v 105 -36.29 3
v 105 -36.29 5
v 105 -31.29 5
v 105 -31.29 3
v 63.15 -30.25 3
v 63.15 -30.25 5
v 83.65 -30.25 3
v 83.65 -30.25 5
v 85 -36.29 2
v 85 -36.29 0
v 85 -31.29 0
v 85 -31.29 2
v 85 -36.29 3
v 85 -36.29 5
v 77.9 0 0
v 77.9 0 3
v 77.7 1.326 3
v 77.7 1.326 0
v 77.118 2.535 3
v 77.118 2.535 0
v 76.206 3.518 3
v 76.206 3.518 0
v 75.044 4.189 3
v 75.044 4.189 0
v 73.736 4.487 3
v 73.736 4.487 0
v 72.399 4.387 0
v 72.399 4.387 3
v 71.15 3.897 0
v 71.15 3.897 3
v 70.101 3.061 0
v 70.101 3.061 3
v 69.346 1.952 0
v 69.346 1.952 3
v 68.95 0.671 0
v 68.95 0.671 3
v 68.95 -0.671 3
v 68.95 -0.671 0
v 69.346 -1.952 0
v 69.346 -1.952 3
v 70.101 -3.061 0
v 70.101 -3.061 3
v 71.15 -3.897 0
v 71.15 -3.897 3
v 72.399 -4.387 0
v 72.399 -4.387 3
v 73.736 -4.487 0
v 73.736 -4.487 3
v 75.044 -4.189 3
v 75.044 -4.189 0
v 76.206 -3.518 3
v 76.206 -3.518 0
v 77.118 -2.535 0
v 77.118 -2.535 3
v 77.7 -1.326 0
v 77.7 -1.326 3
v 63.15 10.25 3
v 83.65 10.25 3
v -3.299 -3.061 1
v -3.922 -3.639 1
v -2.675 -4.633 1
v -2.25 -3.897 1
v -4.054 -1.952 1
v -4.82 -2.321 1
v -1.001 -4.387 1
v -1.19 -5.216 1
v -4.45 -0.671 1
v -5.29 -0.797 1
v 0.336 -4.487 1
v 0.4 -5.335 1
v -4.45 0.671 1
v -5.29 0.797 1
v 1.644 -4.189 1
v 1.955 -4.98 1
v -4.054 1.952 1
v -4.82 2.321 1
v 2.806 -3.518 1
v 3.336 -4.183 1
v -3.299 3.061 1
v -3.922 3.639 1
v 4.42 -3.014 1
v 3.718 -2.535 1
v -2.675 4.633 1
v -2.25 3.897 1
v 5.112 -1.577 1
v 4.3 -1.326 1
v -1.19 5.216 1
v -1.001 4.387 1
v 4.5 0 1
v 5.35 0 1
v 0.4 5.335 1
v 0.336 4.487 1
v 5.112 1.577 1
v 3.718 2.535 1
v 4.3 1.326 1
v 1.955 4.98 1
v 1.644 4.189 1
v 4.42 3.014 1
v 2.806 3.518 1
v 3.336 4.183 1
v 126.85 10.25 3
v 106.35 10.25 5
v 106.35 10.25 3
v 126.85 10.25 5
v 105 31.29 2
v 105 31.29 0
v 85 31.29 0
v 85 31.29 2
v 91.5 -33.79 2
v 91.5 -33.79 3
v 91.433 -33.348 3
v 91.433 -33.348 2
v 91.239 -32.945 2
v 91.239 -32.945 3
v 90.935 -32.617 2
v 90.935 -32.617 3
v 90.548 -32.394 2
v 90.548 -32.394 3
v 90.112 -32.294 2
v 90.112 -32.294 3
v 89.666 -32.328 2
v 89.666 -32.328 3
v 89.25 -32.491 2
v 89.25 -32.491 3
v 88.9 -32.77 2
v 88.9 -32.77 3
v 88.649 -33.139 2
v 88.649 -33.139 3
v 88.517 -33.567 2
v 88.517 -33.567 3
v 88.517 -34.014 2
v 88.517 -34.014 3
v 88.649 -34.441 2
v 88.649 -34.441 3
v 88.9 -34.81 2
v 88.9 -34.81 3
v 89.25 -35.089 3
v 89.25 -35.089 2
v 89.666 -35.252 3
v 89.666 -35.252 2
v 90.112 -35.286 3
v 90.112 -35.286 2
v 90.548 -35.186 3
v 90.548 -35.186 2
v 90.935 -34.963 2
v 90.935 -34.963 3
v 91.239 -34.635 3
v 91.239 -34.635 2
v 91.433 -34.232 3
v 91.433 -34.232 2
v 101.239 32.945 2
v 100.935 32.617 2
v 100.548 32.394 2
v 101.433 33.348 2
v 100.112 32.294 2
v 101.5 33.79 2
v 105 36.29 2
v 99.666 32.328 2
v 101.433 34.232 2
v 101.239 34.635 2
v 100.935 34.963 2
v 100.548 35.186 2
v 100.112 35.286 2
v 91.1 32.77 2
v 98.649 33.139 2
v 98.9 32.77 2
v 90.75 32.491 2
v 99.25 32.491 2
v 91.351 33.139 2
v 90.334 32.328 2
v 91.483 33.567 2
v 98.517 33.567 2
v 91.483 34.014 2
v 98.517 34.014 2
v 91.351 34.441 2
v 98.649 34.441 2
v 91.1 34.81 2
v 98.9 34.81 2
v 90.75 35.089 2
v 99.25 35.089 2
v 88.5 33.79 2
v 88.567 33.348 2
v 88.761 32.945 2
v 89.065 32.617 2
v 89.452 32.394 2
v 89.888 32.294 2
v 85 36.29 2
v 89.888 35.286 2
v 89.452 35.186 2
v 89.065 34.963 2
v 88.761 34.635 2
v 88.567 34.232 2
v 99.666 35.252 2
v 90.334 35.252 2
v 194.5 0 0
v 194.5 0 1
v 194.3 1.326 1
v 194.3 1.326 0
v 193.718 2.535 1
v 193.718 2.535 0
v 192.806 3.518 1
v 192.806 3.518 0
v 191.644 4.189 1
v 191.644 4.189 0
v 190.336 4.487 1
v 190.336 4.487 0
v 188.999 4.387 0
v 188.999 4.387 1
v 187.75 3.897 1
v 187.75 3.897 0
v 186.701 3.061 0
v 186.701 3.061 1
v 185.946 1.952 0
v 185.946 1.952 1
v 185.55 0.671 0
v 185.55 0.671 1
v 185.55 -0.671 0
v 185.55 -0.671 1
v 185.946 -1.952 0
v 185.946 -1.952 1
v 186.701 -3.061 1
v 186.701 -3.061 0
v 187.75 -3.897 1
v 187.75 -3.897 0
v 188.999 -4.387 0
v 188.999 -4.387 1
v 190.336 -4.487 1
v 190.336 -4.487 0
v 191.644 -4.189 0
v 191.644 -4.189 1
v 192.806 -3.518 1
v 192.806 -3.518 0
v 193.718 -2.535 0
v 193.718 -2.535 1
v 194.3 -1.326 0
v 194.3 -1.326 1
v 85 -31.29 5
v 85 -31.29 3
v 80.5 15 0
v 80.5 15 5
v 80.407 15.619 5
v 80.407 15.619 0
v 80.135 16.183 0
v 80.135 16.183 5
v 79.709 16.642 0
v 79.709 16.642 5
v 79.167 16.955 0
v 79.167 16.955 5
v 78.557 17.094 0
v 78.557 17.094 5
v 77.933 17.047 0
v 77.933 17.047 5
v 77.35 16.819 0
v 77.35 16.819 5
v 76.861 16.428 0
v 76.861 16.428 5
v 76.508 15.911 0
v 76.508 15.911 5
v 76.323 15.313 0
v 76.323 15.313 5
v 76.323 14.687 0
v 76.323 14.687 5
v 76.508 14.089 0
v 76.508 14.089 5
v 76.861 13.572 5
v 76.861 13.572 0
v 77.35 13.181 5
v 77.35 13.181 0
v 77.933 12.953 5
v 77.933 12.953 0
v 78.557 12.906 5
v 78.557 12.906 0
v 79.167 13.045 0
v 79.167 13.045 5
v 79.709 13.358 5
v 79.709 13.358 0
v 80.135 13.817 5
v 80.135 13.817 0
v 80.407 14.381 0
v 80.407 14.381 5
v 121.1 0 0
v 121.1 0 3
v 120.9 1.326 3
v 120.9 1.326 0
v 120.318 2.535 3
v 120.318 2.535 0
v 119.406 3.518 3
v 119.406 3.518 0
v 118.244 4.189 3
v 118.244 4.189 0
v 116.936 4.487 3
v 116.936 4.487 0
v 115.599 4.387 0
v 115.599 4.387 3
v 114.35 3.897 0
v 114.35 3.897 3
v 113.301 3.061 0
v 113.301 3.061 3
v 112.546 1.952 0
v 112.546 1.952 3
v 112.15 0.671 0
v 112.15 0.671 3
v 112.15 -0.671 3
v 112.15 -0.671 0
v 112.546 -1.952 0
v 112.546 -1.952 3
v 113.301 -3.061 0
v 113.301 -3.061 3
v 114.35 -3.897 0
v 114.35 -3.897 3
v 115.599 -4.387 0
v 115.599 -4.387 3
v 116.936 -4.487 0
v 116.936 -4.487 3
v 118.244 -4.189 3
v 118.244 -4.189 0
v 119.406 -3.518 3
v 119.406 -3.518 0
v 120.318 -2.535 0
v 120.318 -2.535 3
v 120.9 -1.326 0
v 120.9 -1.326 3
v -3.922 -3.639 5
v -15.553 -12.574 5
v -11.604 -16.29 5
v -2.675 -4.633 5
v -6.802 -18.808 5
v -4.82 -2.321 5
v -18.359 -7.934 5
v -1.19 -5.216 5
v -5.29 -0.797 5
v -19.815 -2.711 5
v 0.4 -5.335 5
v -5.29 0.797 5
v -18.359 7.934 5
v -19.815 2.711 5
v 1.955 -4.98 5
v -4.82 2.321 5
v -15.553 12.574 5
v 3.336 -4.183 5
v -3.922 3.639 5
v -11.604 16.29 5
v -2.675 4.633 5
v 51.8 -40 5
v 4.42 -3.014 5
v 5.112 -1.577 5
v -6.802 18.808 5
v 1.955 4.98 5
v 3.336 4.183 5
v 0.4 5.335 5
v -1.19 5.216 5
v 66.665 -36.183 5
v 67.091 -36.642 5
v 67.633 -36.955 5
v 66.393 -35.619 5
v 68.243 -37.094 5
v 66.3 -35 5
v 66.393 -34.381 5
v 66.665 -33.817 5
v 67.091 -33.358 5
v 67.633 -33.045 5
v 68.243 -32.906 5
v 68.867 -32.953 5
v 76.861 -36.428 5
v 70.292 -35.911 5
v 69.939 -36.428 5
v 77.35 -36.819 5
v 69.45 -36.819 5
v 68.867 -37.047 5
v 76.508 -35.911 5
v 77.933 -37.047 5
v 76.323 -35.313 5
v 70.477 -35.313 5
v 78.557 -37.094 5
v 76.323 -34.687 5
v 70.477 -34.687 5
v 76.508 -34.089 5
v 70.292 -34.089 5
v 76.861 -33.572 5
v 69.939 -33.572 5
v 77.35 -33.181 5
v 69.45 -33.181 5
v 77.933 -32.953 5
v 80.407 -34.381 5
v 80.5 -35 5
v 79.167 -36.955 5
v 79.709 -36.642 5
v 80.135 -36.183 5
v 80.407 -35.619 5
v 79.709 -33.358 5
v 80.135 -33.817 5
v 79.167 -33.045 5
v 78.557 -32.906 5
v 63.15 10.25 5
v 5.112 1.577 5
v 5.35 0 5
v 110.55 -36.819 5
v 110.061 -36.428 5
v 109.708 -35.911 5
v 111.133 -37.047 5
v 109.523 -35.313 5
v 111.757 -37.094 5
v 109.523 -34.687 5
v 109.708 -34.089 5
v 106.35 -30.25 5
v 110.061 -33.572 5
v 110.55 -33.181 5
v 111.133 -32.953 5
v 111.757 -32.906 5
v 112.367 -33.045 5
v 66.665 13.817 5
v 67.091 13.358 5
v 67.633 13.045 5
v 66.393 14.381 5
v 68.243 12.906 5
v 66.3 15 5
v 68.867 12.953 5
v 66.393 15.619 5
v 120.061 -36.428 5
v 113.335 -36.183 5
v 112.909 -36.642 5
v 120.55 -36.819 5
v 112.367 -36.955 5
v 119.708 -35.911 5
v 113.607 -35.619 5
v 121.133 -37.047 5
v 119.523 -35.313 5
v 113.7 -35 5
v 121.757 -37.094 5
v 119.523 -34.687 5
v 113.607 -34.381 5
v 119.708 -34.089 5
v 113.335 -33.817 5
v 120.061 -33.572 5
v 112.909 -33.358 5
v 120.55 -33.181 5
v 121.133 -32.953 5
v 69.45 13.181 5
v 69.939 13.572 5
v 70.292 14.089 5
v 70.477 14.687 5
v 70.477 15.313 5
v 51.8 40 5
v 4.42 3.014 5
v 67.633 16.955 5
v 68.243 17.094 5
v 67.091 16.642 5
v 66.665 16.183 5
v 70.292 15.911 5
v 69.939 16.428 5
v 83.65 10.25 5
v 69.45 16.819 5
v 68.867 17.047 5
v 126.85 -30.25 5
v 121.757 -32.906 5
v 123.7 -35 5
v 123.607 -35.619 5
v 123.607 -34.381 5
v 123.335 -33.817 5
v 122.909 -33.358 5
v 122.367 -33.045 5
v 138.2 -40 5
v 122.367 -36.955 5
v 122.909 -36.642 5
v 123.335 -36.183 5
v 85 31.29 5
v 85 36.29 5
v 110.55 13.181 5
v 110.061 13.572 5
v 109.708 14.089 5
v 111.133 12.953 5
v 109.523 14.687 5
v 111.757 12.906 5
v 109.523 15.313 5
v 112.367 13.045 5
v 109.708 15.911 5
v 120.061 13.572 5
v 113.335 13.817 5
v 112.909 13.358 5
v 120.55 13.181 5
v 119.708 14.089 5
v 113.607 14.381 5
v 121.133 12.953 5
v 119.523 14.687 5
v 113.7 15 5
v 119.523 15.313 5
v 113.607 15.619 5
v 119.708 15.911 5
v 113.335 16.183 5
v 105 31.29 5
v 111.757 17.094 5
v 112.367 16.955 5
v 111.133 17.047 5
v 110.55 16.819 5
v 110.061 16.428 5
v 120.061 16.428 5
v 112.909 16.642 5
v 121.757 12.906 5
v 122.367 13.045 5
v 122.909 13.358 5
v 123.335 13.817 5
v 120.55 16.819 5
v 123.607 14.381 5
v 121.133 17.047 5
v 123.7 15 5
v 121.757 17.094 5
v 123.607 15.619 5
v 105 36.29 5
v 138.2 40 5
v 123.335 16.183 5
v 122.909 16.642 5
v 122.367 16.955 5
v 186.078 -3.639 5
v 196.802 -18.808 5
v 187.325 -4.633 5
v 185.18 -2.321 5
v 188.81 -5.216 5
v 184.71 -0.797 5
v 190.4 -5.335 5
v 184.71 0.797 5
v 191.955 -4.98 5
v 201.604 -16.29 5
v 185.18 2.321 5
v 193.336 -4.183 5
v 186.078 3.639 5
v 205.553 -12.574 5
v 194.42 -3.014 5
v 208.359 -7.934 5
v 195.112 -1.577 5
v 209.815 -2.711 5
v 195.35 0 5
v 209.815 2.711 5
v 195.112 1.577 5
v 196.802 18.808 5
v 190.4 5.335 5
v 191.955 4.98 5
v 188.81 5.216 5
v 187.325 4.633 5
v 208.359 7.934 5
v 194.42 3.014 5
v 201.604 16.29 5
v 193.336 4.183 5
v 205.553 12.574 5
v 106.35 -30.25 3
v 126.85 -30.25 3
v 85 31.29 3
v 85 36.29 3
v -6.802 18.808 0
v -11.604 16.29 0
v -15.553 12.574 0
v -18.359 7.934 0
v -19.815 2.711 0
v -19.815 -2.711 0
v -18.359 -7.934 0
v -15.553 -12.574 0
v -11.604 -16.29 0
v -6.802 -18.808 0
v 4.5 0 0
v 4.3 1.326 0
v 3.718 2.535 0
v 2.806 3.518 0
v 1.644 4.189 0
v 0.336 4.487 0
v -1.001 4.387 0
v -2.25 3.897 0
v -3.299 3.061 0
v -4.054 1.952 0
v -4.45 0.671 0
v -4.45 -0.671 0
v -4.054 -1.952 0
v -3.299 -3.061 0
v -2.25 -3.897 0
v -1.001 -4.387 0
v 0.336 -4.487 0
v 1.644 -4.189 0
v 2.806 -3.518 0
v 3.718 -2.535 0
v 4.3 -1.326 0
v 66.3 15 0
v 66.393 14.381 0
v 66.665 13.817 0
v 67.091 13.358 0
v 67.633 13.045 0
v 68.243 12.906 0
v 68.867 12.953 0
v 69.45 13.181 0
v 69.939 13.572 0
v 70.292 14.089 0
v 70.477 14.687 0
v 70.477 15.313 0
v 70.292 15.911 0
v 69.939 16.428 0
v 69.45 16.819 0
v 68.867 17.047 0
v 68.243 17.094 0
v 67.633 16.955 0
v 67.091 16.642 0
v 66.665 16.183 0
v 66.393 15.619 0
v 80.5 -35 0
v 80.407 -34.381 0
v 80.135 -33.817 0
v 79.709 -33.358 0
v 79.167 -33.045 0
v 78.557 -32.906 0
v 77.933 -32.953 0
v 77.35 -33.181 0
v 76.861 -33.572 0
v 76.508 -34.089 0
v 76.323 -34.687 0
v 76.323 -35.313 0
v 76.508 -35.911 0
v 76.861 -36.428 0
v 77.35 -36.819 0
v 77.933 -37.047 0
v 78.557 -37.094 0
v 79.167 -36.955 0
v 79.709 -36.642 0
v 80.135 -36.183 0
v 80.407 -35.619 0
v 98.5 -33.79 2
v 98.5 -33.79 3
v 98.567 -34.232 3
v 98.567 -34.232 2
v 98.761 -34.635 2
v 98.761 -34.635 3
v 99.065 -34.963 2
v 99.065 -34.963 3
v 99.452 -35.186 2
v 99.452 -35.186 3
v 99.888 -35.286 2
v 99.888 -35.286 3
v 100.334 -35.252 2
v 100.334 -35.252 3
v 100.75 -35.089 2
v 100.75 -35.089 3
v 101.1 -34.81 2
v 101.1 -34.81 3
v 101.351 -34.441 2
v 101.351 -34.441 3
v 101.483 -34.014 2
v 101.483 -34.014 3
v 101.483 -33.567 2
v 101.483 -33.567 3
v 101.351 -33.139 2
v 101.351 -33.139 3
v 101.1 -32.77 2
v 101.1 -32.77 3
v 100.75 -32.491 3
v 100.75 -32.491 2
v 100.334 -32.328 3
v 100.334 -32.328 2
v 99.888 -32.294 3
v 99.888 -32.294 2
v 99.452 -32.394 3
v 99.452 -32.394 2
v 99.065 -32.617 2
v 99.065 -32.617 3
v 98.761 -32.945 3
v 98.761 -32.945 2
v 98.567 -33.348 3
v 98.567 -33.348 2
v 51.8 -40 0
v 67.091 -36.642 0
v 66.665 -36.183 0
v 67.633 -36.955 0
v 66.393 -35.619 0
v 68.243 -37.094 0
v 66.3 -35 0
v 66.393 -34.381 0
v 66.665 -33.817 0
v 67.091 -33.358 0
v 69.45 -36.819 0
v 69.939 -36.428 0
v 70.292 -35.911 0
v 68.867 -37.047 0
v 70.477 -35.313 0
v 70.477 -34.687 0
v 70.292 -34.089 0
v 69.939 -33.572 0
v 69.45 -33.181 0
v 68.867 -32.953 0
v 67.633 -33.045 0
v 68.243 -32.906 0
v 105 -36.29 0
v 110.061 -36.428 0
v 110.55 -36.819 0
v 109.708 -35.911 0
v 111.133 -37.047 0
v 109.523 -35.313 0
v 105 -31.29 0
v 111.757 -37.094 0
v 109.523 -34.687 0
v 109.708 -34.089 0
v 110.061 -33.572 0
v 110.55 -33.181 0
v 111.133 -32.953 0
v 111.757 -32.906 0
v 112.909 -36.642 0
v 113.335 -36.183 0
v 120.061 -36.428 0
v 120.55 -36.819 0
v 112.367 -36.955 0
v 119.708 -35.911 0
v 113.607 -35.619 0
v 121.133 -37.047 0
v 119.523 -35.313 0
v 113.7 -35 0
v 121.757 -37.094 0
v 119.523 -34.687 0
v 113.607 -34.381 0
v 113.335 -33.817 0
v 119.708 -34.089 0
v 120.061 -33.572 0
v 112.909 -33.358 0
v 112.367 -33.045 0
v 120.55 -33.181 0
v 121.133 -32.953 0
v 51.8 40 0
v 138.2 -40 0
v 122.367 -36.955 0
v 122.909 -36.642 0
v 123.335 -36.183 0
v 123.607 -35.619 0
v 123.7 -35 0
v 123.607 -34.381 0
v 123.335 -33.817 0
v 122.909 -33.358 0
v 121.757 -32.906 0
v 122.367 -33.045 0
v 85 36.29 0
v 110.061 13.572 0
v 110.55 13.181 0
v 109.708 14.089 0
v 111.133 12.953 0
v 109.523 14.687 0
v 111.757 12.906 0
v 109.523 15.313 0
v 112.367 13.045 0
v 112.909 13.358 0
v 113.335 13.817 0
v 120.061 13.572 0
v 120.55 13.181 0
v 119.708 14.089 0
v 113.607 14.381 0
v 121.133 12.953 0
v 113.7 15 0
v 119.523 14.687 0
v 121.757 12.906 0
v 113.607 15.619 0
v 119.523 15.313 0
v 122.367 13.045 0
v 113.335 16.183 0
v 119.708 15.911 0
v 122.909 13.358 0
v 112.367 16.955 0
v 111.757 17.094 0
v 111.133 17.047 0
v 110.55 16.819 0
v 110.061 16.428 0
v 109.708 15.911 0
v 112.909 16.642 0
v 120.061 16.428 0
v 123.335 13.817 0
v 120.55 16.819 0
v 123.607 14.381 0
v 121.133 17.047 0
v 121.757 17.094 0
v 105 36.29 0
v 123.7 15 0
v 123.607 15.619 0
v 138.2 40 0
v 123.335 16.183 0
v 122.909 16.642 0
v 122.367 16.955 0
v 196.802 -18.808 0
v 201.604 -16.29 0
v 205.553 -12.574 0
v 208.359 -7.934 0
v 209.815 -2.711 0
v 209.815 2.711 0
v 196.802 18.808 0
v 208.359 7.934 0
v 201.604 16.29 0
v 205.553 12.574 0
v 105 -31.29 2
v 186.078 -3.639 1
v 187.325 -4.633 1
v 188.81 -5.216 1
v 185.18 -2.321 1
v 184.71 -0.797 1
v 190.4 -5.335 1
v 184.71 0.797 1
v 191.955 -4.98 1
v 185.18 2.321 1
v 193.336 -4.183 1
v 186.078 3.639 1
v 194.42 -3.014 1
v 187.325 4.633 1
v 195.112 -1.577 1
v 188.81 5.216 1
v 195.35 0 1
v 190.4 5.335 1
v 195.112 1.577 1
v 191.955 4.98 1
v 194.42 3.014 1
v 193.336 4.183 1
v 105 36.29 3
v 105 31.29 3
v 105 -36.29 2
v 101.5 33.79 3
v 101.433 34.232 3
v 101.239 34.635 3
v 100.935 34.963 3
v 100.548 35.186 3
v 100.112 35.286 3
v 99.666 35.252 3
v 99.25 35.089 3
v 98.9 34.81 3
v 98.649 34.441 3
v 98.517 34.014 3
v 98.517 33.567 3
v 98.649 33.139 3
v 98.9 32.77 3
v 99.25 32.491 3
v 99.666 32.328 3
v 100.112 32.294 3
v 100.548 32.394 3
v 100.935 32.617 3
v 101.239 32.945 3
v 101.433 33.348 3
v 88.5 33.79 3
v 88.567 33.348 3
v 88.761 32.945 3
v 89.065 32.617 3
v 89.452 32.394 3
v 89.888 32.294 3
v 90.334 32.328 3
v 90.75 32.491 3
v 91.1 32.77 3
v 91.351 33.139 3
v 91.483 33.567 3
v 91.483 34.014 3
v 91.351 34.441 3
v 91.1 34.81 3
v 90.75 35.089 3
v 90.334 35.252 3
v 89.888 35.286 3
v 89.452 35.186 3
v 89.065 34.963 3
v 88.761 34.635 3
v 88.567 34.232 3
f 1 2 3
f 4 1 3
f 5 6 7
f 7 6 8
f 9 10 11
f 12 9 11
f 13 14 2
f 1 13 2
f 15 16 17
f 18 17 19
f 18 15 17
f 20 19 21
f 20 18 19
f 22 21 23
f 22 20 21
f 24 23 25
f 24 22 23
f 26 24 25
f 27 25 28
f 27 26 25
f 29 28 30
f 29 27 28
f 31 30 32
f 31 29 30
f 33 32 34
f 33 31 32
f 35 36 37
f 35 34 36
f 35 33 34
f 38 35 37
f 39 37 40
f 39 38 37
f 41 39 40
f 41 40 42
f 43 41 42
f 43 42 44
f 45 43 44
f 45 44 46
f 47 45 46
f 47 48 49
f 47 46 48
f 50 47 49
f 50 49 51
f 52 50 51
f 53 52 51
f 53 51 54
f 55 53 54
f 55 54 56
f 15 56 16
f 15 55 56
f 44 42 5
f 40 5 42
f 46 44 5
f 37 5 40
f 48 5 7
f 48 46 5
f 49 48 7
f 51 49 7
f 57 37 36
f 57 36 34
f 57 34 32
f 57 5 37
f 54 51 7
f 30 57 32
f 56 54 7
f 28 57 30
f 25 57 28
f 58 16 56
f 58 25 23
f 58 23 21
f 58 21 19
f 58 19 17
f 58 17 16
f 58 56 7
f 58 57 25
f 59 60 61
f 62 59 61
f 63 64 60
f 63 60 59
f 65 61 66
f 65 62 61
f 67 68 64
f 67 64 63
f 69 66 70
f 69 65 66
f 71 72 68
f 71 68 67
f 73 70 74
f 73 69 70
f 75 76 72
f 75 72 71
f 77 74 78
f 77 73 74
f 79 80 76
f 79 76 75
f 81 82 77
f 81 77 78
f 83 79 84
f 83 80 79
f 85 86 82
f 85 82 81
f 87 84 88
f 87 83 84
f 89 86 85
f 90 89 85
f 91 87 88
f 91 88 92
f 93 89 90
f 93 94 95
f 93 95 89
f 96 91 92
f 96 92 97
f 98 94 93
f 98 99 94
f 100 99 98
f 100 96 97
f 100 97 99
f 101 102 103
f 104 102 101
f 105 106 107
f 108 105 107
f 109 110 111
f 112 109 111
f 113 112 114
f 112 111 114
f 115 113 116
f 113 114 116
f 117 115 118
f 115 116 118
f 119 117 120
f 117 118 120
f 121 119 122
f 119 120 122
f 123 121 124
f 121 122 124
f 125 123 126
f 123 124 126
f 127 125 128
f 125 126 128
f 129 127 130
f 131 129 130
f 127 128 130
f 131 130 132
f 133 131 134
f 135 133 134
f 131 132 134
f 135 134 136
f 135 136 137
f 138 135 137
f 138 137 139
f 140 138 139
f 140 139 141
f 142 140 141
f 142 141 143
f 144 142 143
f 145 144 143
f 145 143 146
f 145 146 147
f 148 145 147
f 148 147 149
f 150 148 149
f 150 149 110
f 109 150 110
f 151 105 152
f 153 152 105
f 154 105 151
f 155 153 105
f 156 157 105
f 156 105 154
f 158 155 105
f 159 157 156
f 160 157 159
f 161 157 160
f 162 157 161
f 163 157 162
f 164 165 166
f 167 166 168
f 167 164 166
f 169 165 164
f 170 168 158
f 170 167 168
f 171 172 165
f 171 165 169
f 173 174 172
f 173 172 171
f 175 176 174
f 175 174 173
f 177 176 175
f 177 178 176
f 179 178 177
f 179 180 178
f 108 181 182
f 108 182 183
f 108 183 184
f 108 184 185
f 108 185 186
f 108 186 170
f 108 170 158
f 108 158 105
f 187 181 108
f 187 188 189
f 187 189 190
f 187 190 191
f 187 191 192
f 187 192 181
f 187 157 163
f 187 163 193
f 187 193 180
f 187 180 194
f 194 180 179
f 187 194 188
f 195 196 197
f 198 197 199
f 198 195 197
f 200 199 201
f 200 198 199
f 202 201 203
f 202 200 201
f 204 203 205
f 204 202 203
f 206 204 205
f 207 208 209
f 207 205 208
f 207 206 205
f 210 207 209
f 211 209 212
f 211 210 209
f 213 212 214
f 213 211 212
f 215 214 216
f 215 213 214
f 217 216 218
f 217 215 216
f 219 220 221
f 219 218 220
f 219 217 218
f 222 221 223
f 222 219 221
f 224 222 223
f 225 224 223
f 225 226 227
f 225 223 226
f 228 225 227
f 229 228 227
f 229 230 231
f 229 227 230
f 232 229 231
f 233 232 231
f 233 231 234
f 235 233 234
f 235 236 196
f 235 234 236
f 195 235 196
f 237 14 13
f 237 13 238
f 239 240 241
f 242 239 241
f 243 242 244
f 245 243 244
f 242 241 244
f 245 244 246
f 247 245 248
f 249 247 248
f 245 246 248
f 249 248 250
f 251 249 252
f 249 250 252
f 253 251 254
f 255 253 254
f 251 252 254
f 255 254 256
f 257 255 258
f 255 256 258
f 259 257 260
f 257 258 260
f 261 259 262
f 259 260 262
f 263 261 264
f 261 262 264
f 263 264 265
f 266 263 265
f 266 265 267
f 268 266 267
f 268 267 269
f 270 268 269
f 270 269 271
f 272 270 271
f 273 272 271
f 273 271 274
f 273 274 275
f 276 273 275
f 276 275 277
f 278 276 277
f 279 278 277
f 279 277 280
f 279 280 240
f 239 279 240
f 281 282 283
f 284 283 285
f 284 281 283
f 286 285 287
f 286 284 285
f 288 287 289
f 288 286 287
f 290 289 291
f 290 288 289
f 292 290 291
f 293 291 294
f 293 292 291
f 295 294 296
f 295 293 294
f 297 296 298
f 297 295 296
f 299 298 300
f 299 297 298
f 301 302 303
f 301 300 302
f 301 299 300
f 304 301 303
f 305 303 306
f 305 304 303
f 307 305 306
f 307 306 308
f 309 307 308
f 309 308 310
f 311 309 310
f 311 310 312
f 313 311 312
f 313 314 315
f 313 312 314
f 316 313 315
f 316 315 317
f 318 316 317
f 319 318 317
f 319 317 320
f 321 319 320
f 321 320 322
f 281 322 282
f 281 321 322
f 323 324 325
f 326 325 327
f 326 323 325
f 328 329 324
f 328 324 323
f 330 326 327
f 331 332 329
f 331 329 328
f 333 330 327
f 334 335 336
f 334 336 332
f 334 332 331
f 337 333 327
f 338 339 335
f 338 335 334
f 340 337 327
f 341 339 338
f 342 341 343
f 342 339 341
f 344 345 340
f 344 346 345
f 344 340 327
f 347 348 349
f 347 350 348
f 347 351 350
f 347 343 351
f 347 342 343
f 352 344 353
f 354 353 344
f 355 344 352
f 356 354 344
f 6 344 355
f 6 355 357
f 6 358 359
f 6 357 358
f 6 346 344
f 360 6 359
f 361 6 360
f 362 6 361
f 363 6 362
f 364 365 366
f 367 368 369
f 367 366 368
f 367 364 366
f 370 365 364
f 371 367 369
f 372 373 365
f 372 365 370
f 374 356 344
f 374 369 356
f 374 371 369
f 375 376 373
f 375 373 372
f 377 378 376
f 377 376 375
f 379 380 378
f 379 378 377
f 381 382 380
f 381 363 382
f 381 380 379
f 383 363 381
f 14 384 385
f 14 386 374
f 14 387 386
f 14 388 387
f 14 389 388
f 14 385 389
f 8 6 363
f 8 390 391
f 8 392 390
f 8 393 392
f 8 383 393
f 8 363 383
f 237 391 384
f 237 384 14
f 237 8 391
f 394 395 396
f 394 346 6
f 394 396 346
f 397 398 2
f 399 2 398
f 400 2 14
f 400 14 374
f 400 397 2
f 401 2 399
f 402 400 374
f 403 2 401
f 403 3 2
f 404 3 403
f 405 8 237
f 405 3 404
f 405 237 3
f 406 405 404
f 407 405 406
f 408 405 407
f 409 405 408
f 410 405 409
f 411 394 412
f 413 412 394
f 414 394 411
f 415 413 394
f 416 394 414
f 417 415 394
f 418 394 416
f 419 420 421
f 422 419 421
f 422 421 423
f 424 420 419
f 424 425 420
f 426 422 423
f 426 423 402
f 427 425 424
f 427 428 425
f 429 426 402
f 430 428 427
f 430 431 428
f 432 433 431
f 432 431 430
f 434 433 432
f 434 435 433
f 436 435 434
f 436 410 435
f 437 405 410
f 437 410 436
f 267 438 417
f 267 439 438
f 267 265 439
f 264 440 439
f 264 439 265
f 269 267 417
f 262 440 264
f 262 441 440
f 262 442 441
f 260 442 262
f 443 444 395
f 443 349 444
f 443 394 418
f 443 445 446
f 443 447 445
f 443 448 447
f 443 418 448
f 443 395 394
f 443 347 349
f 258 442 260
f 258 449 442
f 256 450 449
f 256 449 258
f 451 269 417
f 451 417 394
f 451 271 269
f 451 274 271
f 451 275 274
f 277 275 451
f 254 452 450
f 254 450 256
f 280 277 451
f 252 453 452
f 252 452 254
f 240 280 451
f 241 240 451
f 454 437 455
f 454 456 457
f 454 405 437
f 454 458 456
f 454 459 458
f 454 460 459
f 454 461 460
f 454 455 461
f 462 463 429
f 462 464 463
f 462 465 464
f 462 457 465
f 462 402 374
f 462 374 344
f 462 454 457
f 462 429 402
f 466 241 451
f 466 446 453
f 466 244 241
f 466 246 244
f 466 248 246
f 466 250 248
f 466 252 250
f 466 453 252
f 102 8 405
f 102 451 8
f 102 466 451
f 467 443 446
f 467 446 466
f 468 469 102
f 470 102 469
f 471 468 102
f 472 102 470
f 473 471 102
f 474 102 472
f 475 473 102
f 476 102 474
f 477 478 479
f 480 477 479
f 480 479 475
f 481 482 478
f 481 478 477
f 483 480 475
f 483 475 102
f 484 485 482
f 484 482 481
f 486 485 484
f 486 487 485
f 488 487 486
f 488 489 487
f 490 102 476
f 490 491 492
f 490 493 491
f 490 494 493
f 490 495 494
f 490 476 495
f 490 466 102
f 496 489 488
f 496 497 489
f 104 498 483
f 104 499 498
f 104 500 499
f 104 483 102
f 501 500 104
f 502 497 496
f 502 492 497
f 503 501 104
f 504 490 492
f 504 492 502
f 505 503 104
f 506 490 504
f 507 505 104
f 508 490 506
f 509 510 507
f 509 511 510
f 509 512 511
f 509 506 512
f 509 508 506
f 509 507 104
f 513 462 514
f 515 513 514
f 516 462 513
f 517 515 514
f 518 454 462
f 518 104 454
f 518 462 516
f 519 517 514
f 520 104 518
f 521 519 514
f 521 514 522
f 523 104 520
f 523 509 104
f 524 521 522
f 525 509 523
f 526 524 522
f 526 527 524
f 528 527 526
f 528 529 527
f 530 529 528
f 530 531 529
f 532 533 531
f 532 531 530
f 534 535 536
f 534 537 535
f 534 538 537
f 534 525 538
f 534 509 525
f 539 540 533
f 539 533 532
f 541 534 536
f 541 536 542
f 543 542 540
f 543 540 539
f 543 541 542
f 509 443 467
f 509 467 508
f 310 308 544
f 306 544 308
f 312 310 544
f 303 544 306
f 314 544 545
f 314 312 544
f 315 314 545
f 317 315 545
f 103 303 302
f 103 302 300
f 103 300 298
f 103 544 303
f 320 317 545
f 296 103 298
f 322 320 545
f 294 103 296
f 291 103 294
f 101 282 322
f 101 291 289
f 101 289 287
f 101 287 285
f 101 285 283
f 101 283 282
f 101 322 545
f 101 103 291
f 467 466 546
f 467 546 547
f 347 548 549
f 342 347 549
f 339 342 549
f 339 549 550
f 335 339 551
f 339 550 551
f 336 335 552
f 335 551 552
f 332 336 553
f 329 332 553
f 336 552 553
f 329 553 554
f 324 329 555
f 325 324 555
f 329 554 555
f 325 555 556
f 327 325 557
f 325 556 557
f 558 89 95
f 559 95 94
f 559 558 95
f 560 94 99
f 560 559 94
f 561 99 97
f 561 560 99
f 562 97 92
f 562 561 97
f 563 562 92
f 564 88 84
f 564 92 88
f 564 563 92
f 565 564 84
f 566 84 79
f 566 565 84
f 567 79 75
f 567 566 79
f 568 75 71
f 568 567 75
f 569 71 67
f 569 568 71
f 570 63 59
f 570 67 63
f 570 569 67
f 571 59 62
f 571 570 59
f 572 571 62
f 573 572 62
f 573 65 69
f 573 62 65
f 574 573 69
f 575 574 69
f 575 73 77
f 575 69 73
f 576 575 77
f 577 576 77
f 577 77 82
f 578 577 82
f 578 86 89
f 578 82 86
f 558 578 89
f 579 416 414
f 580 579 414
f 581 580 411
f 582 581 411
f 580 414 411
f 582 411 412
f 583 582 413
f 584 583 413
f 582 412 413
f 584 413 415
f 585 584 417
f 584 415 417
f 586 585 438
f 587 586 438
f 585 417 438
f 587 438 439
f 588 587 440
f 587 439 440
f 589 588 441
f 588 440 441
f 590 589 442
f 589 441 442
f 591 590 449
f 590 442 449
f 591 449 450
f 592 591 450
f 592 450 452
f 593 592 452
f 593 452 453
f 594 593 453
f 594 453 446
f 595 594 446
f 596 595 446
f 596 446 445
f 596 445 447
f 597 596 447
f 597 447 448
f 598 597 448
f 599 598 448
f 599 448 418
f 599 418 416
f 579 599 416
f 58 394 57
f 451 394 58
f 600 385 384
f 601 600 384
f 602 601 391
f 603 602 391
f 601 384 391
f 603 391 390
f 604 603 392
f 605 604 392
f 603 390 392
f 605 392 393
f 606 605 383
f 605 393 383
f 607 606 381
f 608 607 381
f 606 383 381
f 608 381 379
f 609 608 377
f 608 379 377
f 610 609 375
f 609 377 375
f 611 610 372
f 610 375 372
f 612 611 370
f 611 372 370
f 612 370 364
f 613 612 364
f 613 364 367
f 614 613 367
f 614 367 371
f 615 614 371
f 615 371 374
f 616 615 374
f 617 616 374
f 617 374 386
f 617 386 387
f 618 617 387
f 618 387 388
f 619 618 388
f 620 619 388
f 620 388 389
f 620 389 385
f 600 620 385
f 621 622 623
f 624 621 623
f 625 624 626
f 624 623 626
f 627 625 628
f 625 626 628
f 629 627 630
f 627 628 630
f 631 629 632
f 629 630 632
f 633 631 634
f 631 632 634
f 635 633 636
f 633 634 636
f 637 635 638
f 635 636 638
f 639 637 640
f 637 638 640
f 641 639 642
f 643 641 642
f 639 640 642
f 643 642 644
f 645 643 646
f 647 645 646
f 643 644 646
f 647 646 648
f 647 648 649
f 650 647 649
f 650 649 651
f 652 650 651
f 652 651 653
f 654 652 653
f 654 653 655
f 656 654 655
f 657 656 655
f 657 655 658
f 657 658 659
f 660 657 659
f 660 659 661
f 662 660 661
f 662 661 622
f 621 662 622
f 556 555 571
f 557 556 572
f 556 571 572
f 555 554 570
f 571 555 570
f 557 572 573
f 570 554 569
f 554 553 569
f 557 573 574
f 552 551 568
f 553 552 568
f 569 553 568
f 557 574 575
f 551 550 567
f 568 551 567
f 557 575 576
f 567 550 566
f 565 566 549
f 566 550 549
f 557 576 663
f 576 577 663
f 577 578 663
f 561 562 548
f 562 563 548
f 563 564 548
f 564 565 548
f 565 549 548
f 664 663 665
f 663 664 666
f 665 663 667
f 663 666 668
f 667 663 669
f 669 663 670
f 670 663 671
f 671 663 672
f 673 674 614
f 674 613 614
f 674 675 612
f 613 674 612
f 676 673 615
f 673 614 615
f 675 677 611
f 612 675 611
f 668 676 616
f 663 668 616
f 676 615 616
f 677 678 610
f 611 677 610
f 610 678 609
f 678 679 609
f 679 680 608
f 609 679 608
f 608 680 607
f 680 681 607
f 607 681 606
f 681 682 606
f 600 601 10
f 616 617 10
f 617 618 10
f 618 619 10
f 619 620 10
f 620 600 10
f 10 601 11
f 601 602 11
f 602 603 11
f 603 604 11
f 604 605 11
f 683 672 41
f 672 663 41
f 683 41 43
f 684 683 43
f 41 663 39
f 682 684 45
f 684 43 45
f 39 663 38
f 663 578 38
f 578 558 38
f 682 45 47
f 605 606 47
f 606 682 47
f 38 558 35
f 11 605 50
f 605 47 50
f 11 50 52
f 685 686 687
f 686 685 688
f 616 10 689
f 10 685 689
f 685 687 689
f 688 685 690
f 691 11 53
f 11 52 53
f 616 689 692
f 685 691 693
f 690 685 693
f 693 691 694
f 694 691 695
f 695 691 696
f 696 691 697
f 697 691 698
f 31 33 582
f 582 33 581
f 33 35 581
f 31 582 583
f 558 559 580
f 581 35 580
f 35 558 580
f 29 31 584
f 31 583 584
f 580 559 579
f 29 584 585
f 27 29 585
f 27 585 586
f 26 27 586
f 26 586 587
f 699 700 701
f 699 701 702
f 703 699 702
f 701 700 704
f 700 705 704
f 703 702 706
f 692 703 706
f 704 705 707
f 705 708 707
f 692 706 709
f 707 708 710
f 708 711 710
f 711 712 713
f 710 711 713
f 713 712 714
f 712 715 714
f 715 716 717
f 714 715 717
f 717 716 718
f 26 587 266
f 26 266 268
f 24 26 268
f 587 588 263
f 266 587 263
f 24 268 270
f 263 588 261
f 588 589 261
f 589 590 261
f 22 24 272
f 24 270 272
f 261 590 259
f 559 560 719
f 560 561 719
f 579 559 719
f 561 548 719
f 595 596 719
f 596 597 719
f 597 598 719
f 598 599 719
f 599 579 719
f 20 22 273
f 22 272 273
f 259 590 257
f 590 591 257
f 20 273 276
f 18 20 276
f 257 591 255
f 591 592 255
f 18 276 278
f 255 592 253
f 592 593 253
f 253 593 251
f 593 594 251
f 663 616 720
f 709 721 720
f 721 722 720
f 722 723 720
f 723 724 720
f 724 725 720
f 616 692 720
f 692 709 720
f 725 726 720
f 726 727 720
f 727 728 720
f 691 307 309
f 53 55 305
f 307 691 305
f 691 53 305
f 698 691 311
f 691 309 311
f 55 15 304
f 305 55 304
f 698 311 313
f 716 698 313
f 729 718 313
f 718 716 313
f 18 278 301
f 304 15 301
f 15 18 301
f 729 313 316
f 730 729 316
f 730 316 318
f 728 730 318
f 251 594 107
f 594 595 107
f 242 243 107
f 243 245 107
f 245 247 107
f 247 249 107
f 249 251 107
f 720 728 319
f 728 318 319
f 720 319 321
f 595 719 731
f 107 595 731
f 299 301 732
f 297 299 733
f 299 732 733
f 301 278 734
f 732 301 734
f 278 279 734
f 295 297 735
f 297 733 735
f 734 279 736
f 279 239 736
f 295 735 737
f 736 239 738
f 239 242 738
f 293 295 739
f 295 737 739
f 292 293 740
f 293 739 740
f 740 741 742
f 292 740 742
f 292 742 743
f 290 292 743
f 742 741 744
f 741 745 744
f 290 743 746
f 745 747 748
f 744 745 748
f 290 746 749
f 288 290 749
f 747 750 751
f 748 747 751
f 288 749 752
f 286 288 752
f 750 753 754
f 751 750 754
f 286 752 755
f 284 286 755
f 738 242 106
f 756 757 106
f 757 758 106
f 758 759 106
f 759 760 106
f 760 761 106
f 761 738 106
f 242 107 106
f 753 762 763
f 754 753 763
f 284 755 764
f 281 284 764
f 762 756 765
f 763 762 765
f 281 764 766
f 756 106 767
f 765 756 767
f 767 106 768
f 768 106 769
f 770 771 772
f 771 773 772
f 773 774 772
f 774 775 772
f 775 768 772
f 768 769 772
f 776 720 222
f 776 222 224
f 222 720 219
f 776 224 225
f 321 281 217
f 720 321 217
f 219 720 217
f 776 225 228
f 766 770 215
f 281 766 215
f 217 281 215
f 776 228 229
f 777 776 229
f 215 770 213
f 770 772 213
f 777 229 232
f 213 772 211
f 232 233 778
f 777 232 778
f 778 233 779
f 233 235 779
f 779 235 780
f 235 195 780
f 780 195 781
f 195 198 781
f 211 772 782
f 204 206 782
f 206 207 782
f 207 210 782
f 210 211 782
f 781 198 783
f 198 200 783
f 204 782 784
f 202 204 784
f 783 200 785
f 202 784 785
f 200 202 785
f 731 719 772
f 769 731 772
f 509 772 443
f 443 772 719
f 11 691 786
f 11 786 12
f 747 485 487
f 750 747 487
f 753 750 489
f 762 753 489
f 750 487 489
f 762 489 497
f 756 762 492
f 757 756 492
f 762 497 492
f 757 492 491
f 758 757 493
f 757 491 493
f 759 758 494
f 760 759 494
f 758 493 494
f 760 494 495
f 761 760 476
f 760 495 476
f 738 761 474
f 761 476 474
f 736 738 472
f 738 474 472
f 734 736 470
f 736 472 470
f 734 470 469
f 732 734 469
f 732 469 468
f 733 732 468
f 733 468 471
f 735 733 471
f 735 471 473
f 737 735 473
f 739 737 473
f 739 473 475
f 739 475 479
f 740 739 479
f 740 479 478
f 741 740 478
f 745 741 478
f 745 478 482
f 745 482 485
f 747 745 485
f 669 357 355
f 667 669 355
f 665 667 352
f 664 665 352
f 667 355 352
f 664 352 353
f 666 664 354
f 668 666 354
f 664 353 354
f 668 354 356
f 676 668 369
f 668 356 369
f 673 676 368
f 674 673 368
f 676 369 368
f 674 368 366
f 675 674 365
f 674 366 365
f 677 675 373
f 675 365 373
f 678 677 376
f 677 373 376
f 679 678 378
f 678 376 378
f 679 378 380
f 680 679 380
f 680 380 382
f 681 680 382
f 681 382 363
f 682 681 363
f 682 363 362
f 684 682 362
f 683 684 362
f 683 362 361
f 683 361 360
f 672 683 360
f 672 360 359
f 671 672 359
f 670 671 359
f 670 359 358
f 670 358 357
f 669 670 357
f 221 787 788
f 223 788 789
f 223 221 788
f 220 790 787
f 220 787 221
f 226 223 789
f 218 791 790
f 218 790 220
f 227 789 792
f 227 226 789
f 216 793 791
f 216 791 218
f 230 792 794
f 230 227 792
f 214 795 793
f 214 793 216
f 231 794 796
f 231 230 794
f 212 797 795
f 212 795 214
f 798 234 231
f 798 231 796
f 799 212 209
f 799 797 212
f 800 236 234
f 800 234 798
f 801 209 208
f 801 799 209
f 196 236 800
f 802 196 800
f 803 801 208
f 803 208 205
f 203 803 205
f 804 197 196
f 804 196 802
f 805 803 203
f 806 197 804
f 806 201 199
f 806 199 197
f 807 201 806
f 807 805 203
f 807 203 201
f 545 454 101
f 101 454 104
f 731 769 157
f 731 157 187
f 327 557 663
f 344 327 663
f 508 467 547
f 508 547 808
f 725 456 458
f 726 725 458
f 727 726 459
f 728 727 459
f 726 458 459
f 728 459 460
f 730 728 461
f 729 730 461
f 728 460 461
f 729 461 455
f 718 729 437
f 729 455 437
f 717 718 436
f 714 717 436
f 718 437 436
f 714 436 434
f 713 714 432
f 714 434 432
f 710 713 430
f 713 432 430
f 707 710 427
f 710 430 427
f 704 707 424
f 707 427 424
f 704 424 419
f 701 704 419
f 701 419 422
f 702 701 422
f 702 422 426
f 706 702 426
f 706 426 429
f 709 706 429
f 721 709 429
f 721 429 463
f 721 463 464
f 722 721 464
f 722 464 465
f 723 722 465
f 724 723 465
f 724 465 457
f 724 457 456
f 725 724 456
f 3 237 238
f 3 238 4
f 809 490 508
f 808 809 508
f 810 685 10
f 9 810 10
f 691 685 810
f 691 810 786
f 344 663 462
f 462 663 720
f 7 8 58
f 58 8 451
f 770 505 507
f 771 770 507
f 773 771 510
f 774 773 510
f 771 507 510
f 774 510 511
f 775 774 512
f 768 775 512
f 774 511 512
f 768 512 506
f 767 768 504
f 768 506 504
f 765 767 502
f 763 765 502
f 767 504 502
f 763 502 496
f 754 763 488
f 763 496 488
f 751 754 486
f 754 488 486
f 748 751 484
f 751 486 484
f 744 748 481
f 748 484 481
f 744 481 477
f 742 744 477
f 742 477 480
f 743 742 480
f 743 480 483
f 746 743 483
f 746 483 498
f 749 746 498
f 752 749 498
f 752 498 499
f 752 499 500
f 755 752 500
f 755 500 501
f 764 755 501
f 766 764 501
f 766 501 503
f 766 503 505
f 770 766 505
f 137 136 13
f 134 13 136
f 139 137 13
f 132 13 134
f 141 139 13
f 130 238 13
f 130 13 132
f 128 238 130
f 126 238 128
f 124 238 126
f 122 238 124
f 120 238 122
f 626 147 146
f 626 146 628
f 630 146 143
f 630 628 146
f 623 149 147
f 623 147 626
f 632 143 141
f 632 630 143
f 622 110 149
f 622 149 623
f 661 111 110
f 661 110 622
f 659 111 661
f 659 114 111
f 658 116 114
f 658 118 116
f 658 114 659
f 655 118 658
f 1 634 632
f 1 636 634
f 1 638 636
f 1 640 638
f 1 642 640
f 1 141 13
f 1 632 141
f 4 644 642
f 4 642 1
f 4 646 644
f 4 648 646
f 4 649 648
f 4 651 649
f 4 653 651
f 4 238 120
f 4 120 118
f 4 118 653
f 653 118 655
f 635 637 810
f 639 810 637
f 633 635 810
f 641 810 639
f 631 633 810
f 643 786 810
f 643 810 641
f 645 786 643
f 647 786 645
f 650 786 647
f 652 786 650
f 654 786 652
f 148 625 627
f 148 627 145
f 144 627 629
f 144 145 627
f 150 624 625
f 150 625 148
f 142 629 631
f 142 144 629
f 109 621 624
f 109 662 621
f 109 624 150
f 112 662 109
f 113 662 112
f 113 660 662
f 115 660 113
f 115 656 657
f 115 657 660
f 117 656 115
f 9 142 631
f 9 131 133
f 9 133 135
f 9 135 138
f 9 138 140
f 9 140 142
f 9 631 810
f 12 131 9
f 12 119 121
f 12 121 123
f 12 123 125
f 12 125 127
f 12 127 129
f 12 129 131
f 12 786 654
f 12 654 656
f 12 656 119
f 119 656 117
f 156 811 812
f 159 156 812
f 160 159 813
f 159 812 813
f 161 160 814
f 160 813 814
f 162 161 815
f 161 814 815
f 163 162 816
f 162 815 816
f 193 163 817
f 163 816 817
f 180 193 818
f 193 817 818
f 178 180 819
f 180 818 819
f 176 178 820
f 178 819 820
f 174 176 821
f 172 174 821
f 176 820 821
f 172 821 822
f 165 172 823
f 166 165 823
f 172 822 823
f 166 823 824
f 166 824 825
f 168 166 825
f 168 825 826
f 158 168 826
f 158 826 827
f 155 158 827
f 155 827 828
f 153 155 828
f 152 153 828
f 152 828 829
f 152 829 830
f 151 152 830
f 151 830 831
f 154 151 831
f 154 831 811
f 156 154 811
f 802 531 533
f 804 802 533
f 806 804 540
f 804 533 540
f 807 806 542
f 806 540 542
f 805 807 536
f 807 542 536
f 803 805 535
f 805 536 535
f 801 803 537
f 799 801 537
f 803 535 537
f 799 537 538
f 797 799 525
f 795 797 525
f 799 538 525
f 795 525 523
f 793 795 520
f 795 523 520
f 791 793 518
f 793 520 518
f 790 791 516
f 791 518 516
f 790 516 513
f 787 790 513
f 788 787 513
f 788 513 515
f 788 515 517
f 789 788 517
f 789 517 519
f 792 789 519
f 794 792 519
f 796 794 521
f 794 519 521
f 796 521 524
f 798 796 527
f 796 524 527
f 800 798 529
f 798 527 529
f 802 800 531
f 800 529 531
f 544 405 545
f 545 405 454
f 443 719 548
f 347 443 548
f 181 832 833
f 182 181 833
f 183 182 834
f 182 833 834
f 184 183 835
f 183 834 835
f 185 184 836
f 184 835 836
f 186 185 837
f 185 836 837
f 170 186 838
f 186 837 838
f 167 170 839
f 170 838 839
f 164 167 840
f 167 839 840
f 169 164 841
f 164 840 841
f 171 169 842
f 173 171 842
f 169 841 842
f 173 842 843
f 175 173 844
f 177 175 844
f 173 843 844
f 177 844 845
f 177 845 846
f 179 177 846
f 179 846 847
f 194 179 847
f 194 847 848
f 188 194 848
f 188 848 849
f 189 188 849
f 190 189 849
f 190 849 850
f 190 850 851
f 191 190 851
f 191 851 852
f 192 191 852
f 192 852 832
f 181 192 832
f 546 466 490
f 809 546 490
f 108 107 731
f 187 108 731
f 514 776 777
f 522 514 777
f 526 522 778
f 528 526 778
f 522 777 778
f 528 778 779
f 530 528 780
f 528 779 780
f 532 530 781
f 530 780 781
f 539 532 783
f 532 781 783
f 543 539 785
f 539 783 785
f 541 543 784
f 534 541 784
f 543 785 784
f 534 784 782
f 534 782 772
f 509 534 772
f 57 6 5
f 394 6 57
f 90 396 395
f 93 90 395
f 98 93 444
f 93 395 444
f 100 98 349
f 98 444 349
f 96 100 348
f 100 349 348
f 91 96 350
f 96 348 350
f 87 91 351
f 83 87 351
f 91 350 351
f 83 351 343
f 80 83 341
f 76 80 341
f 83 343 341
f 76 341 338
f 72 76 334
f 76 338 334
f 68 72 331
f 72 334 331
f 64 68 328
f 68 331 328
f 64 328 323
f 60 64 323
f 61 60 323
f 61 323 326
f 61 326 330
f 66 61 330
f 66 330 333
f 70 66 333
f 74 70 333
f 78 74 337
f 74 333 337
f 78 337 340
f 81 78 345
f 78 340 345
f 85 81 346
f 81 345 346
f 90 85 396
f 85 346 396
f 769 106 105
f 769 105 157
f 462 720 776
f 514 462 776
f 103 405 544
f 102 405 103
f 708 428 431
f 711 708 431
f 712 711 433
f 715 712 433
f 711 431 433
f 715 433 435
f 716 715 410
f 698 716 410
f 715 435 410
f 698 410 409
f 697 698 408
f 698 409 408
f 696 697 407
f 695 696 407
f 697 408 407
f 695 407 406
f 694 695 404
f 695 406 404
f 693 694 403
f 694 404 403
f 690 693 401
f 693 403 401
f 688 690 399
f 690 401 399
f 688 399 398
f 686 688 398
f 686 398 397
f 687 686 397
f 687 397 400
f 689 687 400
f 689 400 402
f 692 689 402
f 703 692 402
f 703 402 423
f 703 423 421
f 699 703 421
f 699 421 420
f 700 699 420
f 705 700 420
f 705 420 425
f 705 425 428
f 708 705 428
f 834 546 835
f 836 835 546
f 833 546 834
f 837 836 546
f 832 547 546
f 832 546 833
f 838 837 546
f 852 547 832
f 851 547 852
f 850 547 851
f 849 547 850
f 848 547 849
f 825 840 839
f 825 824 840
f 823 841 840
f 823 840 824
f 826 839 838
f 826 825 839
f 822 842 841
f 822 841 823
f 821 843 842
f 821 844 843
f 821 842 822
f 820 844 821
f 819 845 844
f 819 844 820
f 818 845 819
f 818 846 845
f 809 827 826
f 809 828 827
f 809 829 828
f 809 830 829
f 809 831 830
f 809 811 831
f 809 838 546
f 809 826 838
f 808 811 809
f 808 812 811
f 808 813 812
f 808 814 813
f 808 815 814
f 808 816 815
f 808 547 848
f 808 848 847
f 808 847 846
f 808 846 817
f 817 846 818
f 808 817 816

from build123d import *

# Parameters (mm, degrees)
SKETCH_1_R           = 4.5
EXTRUDE_4_DEPTH      = 5
SKETCH_3_R           = 5.35
CUT_EXTRUDE_3_DEPTH  = 4
SKETCH_11_R          = 1.5
CUT_EXTRUDE_13_DEPTH = 214.834047803
SKETCH_12_W          = 20
SKETCH_12_H          = 5
CUT_EXTRUDE_14_DEPTH = 2
SKETCH_13_W          = 20
SKETCH_13_H          = 5
CUT_EXTRUDE_15_DEPTH = 2
SKETCH_14_R          = 2.1
CUT_EXTRUDE_17_DEPTH = 214.834047803
SKETCH_15_W          = 20.5
SKETCH_15_H          = 40.5
CUT_EXTRUDE_18_DEPTH = 2


with BuildPart() as part:
    # 草图1 → 凸台-拉伸4 (new body)
    with BuildSketch(Plane.XY):
        with BuildLine():
            ThreePointArc((-6.801514389, 18.807961134), (-20, 0), (-6.801514389, -18.807961134))
            Line((-6.801514389, -18.807961134), (51.8, -40))
            Line((51.8, -40), (138.2, -40))
            Line((138.2, -40), (196.801514389, -18.807961134))
            ThreePointArc((196.801514389, -18.807961134), (210, 0), (196.801514389, 18.807961134))
            Line((196.801514389, 18.807961134), (138.2, 40))
            Line((138.2, 40), (51.8, 40))
            Line((51.8, 40), (-6.801514389, 18.807961134))
        make_face()
        with Locations((73.4, 0)):
            Circle(SKETCH_1_R, mode=Mode.SUBTRACT)
        Circle(SKETCH_1_R, mode=Mode.SUBTRACT)
        with Locations((116.6, 0)):
            Circle(SKETCH_1_R, mode=Mode.SUBTRACT)
        with Locations((190, 0)):
            Circle(SKETCH_1_R, mode=Mode.SUBTRACT)
    extrude(amount=EXTRUDE_4_DEPTH)

    # 草图3 → 切除-拉伸3 (cut)
    with BuildSketch(Plane.XY.offset(5)):
        Circle(SKETCH_3_R)
        with Locations((190, 0)):
            Circle(SKETCH_3_R)
    extrude(amount=-CUT_EXTRUDE_3_DEPTH, mode=Mode.SUBTRACT)

    # 草图11 → 切除-拉伸13 (cut, through all)
    with BuildSketch(Plane.XY.offset(5)):
        with Locations((100, 33.790093942)):
            Circle(SKETCH_11_R)
        with Locations(Location((90, 33.790093942, 0), (0, 0, 180))):
            Circle(SKETCH_11_R)
        with Locations(Location((100, -33.790093942, 0), (0, 0, 180))):
            Circle(SKETCH_11_R)
        with Locations((90, -33.790093942)):
            Circle(SKETCH_11_R)
    extrude(amount=-CUT_EXTRUDE_13_DEPTH, mode=Mode.SUBTRACT)

    # 草图12 → 切除-拉伸14 (cut)
    with BuildSketch(Plane.XY.offset(5)):
        with Locations((95, 33.790093942)):
            Rectangle(SKETCH_12_W, SKETCH_12_H)
        with Locations((95, -33.790093942)):
            Rectangle(SKETCH_12_W, SKETCH_12_H)
    extrude(amount=-CUT_EXTRUDE_14_DEPTH, mode=Mode.SUBTRACT)

    # 草图13 → 切除-拉伸15 (cut)
    with BuildSketch(Plane(origin=(0, 0, 0), x_dir=(-1, 0, 0), z_dir=(0, 0, -1))):
        with Locations((-95, 33.790093942)):
            Rectangle(SKETCH_13_W, SKETCH_13_H)
        with Locations((-95, -33.790093942)):
            Rectangle(SKETCH_13_W, SKETCH_13_H)
    extrude(amount=-CUT_EXTRUDE_15_DEPTH, mode=Mode.SUBTRACT)

    # 草图14 → 切除-拉伸17 (cut, through all)
    with BuildSketch(Plane.XY.offset(5)):
        with Locations((78.4, -35)):
            Circle(SKETCH_14_R)
        with Locations((78.4, 15)):
            Circle(SKETCH_14_R)
        with Locations(Location((68.4, -35, 0), (0, 0, 180))):
            Circle(SKETCH_14_R)
        with Locations((111.6, -35)):
            Circle(SKETCH_14_R)
        with Locations((121.6, -35)):
            Circle(SKETCH_14_R)
        with Locations(Location((68.4, 15, 0), (0, 0, 180))):
            Circle(SKETCH_14_R)
        with Locations((111.6, 15)):
            Circle(SKETCH_14_R)
        with Locations((121.6, 15)):
            Circle(SKETCH_14_R)
    extrude(amount=-CUT_EXTRUDE_17_DEPTH, mode=Mode.SUBTRACT)

    # 草图15 → 切除-拉伸18 (cut)
    with BuildSketch(Plane.XY.offset(5)):
        with Locations((73.4, -10)):
            Rectangle(SKETCH_15_W, SKETCH_15_H)
        with Locations((116.6, -10)):
            Rectangle(SKETCH_15_W, SKETCH_15_H)
    extrude(amount=-CUT_EXTRUDE_18_DEPTH, mode=Mode.SUBTRACT)


solid = part.part
